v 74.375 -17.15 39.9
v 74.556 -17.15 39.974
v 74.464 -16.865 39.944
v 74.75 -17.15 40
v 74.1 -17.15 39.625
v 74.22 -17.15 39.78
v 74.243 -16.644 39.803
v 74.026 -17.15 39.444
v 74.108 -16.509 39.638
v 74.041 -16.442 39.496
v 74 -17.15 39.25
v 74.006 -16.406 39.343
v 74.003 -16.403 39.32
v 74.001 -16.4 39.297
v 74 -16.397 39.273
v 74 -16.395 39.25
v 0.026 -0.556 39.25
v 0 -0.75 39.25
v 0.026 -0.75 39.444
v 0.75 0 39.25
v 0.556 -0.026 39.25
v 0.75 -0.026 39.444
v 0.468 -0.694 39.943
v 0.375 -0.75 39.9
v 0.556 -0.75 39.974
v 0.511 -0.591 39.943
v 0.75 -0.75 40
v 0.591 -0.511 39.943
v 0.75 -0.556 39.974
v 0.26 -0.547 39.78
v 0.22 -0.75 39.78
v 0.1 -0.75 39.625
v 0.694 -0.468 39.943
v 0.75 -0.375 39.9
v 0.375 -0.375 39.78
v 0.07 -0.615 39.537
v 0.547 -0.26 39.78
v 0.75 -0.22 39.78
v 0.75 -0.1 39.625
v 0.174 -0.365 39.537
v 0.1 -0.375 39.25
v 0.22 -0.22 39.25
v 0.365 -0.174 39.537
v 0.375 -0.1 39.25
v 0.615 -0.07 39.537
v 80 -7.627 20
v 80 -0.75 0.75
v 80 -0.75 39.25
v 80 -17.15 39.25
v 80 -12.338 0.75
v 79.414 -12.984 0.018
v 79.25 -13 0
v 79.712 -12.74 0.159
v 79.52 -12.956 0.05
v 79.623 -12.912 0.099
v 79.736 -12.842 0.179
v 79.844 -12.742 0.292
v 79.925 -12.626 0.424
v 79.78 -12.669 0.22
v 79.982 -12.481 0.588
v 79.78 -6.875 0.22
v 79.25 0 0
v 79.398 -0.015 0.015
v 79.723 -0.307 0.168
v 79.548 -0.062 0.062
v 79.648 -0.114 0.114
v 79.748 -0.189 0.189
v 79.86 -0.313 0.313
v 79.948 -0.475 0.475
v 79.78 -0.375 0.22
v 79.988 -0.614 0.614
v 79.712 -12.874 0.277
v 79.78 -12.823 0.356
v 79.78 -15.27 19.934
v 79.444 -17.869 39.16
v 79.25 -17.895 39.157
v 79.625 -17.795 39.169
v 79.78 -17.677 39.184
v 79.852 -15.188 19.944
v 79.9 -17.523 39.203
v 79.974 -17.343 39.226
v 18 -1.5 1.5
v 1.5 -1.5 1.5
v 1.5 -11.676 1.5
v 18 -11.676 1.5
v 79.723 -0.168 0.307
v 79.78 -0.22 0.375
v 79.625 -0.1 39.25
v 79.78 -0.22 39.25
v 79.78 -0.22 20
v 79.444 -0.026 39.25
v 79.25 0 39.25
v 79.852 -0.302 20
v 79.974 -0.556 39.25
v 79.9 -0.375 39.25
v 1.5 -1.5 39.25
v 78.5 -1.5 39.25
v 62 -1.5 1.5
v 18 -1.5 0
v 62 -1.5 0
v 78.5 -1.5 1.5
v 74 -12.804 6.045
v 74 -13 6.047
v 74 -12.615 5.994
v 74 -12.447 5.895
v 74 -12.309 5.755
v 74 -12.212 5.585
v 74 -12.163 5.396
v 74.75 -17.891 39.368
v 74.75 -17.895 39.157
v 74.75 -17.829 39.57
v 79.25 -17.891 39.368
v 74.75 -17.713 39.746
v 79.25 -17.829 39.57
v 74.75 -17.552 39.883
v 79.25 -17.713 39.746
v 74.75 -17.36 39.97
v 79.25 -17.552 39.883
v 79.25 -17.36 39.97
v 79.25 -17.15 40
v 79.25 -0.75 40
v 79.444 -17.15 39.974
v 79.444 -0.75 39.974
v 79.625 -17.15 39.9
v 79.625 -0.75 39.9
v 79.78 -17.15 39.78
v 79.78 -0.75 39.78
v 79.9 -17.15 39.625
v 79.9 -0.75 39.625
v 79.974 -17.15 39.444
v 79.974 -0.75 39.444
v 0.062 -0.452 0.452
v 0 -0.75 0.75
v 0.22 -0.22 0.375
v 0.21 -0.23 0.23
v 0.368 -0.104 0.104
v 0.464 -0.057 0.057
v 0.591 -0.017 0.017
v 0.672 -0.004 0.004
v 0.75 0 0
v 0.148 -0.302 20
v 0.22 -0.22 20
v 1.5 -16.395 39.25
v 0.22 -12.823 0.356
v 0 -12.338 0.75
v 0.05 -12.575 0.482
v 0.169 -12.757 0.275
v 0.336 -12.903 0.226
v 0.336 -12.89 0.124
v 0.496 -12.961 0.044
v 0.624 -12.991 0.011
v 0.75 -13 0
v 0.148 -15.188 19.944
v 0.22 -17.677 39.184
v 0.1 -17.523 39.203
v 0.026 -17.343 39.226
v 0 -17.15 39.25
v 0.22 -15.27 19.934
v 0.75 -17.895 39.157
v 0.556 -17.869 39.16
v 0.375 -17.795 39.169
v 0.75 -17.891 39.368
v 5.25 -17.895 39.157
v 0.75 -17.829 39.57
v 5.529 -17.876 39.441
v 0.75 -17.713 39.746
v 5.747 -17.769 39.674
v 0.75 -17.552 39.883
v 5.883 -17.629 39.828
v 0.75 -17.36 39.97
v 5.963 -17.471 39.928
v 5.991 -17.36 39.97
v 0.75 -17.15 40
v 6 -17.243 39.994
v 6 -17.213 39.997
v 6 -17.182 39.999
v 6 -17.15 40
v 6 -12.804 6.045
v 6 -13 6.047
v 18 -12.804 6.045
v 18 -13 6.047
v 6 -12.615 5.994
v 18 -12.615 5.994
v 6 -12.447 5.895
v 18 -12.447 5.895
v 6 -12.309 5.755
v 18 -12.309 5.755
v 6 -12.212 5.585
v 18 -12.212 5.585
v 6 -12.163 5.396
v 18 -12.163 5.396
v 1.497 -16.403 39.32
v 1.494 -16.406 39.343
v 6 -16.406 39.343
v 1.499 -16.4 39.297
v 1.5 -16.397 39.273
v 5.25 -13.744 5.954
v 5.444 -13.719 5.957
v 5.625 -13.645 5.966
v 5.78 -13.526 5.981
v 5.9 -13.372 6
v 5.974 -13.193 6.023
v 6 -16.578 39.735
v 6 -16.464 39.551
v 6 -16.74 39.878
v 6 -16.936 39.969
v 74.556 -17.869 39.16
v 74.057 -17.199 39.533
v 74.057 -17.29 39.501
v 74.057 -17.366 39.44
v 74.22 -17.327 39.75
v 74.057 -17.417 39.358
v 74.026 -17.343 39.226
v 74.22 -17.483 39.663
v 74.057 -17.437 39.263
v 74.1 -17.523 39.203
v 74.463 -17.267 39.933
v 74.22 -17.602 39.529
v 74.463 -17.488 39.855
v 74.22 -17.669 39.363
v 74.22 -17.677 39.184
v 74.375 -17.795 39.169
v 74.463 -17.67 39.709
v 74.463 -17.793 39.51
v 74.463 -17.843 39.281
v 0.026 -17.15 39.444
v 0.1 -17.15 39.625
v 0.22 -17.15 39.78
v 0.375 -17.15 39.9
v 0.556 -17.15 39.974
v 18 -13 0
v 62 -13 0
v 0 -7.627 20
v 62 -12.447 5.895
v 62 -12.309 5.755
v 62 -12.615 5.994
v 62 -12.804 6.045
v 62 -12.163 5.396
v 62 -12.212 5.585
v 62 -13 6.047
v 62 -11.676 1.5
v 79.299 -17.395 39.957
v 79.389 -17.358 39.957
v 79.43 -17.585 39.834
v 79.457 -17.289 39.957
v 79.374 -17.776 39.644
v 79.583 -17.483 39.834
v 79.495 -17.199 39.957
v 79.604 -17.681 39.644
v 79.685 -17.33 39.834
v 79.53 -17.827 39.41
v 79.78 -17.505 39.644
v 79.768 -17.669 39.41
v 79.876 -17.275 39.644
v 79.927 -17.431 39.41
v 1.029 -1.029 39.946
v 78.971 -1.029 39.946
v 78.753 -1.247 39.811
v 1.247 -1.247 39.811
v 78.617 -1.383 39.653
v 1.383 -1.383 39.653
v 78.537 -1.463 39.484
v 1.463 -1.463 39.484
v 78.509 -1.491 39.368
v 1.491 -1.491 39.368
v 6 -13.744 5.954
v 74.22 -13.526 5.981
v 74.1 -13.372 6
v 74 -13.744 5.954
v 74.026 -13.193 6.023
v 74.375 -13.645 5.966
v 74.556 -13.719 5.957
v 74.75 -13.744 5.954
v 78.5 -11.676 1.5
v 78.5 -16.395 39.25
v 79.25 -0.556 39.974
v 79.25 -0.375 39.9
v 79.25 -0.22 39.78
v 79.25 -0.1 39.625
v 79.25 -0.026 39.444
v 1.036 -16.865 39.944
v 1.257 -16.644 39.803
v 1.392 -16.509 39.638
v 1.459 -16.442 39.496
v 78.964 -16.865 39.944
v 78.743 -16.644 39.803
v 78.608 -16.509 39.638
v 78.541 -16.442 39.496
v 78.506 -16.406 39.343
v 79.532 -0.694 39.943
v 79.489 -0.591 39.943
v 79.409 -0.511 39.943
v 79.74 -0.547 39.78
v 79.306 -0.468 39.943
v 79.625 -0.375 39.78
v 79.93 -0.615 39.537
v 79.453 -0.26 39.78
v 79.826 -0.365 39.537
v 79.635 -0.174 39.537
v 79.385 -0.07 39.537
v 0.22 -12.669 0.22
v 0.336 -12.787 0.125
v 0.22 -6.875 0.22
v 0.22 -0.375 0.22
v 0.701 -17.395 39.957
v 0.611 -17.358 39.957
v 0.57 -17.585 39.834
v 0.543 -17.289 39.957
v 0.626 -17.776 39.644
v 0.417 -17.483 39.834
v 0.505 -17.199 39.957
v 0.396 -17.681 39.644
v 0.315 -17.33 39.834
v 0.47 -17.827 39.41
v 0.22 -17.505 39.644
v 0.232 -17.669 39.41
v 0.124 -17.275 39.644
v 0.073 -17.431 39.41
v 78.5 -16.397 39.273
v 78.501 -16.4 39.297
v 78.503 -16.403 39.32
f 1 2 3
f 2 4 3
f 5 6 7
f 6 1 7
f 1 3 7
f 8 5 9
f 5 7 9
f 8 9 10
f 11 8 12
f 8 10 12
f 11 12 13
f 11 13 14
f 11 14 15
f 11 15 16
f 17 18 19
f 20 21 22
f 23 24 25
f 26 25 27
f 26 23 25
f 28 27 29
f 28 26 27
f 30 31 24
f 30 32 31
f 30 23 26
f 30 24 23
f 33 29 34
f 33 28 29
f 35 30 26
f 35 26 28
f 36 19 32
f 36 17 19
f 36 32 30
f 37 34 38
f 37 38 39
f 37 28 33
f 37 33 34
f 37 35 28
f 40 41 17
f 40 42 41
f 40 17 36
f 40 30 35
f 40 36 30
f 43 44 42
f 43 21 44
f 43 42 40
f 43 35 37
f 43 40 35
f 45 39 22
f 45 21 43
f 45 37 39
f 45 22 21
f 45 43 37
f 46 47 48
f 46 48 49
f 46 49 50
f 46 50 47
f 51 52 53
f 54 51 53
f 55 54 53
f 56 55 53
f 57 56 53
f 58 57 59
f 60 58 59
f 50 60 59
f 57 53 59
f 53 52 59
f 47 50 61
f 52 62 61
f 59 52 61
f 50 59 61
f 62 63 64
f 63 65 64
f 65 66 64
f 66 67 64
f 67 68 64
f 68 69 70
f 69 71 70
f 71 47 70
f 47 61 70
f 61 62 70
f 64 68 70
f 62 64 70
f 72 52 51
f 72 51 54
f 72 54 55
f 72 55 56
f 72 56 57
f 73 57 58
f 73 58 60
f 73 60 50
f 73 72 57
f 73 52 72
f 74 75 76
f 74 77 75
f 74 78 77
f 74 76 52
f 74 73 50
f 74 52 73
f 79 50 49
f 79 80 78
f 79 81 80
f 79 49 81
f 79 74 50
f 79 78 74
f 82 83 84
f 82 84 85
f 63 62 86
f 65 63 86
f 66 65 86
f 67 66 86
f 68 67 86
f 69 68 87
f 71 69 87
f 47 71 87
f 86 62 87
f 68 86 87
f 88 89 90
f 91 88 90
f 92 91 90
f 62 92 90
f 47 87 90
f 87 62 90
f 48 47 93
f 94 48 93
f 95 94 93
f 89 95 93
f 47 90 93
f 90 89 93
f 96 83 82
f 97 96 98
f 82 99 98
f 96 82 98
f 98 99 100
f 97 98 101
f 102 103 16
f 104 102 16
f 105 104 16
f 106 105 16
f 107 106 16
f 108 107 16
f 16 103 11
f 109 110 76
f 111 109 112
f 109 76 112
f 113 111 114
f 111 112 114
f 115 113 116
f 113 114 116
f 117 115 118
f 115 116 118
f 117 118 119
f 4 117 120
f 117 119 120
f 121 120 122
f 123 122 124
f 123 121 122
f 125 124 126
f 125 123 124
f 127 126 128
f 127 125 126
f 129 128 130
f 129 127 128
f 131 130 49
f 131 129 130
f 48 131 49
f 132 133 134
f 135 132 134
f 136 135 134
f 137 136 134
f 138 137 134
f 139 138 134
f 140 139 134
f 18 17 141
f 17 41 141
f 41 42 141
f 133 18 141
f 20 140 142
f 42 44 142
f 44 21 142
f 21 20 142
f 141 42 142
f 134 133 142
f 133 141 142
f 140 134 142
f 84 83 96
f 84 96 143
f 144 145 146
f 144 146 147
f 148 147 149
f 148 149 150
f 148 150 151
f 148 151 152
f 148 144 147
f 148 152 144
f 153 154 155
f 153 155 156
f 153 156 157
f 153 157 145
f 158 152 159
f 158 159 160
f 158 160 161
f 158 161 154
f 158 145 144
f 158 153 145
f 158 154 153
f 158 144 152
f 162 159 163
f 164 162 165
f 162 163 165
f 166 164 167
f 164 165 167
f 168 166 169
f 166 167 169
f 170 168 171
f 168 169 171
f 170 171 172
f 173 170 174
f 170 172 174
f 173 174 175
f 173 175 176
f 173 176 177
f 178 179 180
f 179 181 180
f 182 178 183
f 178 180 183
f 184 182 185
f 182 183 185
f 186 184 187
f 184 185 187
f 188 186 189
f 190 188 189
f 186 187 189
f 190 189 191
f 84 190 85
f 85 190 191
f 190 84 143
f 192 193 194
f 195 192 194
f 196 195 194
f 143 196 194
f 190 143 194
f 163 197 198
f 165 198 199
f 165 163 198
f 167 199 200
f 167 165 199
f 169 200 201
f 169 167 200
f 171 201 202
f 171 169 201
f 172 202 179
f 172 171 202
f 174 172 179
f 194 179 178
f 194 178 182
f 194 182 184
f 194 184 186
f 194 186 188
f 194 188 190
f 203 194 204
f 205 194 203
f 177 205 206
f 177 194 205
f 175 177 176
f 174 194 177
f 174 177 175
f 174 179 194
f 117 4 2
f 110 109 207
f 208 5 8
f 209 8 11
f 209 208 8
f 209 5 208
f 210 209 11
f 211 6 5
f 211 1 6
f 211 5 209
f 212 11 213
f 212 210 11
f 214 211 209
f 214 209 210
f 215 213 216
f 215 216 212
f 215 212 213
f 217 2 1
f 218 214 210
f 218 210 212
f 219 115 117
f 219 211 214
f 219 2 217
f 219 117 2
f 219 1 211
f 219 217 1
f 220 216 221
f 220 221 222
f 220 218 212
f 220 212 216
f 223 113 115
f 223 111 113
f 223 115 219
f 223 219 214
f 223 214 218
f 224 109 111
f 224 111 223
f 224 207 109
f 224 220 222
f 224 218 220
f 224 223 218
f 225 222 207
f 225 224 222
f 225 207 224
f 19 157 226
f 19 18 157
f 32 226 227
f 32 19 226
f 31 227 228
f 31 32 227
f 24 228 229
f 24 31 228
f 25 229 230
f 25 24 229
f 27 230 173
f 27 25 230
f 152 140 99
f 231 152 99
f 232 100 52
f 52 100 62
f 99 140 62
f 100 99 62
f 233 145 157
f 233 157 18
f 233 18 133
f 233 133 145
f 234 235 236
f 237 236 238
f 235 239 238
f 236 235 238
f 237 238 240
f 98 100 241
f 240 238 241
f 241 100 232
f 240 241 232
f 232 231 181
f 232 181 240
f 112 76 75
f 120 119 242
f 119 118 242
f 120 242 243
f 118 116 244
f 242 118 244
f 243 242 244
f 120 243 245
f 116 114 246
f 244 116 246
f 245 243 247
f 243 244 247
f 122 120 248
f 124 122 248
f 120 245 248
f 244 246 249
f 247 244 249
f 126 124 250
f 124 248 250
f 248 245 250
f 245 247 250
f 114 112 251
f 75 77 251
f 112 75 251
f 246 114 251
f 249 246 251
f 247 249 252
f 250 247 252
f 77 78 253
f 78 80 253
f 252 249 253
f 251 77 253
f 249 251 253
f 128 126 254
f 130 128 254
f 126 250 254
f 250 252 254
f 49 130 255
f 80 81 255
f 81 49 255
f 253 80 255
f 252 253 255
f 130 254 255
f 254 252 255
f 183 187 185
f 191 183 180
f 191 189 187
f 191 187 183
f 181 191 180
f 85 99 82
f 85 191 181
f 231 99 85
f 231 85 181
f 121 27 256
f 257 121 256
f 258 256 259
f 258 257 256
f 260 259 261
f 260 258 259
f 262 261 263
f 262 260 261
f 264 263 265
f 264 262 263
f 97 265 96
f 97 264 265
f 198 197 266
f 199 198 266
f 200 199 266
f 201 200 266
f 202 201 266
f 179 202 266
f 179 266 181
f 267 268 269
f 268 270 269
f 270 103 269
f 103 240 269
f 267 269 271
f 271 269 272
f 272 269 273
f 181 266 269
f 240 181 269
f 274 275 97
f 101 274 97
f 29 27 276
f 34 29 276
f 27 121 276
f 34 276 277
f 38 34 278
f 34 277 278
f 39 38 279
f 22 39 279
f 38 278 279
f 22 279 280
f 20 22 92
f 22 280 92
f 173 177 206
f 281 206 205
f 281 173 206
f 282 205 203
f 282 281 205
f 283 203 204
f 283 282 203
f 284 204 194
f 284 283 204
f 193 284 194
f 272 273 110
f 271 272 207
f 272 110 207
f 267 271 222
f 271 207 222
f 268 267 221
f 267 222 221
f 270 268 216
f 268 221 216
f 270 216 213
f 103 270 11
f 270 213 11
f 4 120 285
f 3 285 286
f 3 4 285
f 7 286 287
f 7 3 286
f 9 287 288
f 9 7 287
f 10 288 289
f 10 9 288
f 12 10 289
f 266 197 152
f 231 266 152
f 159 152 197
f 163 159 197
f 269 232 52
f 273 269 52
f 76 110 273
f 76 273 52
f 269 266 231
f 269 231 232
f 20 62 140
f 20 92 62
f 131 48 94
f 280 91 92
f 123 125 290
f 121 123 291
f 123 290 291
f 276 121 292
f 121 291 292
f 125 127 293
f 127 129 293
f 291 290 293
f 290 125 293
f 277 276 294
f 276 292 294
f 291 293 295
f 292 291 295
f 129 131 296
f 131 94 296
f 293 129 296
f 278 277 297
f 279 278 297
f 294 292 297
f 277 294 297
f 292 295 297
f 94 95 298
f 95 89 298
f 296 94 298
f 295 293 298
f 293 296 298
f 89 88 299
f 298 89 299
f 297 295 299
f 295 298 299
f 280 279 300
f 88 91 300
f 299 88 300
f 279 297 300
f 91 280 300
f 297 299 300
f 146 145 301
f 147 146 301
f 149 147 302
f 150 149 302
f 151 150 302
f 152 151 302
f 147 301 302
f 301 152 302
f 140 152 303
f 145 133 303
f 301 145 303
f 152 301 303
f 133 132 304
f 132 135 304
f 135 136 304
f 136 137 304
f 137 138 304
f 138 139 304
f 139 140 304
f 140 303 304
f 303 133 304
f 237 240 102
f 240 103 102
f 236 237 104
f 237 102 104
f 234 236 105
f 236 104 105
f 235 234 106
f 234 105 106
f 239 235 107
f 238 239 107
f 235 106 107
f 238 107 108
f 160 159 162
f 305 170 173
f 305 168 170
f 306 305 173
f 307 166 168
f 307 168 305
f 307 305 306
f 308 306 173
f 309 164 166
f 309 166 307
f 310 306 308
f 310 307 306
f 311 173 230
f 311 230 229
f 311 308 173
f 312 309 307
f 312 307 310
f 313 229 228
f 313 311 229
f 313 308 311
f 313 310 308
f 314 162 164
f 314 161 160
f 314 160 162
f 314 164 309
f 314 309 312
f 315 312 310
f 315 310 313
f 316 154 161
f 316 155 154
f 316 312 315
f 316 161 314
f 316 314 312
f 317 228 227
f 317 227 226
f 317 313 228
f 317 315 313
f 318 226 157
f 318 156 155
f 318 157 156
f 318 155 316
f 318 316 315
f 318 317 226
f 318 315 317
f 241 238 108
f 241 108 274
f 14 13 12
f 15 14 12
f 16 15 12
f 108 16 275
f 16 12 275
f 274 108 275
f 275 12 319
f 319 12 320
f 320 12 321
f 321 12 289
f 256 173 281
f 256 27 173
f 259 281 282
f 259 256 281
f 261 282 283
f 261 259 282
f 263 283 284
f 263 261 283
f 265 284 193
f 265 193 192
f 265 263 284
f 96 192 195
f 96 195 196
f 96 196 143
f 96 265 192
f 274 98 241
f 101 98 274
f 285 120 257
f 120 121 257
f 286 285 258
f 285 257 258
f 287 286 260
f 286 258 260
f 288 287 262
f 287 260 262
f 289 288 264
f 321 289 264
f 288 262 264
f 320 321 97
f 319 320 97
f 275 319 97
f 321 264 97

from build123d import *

# Parameters (mm, degrees)
F0_W     = 80
F0_H     = 13
F2_W     = 80
F2_H     = 18
F4_T     = -1.5
F5_W     = 68
F5_H     = 34.3112887415
F6_DEPTH = 2.7
F7_W     = 44
F7_H     = 11.5
F8_DEPTH = 25
F9_R     = 0.74999


# Not quite as in the source:
# - a fillet or chamfer is up to 0.001 mm smaller than in the source, because OpenCascade refuses the exact size


with BuildPart() as f3:
    # F0 (on Top) → F3 section 0
    with BuildSketch(Plane.XY):
        with Locations((40, -6.5)):
            Rectangle(F0_W, F0_H)
    # F2 (on offset) → F3 section 1
    with BuildSketch(Plane.XY.offset(40)):
        with Locations((40, -9)):
            Rectangle(F2_W, F2_H)
    loft()

    # F4
    f4_openings = [f3.faces().sort_by_distance(p)[0] for p in [
        (40, -9, 40),
    ]]
    offset(amount=F4_T, openings=f4_openings)

    # F5 (on face) → F6 (cut)
    with BuildSketch(Plane(origin=(0, -12.8, -1.6), x_dir=(1, 0, 0), z_dir=(0, -0.9922778767, -0.1240347346))):
        with Locations((40, 24.7680959204)):
            Rectangle(F5_W, F5_H)
    extrude(amount=-F6_DEPTH, mode=Mode.SUBTRACT)

    # F7 (on face) → F8 (cut)
    with BuildSketch(Plane(origin=(0, 0, 0), x_dir=(1, 0, 0), z_dir=(0, 0, -1))):
        with Locations((40, 7.25)):
            Rectangle(F7_W, F7_H)
    extrude(amount=-F8_DEPTH, mode=Mode.SUBTRACT)

    # F9 (radius 0.75 in the source; OpenCascade refuses exactly that, so slightly less here)
    f9_edges = [f3.edges().sort_by_distance(p)[0] for p in [
        (80, -15.5, 20),
        (80, -6.5, 0),
        (80, 0, 20),
        (0, -15.5, 20),
        (0, 0, 20),
        (0, -6.5, 0),
        (6, -15.872104, 22.976834),
        (74, -15.872104, 22.976834),
        (3, -18, 40),
        (77, -18, 40),
        (80, -9, 40),
        (74, -17.244163, 40),
        (0, -9, 40),
        (40, 0, 40),
        (3.75, -16.488327, 40),
        (1.5, -8.994163, 40),
        (40, -1.5, 40),
        (78.5, -8.994163, 40),
        (76.25, -16.488327, 40),
        (12, -12.255792, 6.139719),
        (68, -12.255792, 6.139719),
    ]]
    fillet(f9_edges, radius=F9_R)


solid = f3.part
